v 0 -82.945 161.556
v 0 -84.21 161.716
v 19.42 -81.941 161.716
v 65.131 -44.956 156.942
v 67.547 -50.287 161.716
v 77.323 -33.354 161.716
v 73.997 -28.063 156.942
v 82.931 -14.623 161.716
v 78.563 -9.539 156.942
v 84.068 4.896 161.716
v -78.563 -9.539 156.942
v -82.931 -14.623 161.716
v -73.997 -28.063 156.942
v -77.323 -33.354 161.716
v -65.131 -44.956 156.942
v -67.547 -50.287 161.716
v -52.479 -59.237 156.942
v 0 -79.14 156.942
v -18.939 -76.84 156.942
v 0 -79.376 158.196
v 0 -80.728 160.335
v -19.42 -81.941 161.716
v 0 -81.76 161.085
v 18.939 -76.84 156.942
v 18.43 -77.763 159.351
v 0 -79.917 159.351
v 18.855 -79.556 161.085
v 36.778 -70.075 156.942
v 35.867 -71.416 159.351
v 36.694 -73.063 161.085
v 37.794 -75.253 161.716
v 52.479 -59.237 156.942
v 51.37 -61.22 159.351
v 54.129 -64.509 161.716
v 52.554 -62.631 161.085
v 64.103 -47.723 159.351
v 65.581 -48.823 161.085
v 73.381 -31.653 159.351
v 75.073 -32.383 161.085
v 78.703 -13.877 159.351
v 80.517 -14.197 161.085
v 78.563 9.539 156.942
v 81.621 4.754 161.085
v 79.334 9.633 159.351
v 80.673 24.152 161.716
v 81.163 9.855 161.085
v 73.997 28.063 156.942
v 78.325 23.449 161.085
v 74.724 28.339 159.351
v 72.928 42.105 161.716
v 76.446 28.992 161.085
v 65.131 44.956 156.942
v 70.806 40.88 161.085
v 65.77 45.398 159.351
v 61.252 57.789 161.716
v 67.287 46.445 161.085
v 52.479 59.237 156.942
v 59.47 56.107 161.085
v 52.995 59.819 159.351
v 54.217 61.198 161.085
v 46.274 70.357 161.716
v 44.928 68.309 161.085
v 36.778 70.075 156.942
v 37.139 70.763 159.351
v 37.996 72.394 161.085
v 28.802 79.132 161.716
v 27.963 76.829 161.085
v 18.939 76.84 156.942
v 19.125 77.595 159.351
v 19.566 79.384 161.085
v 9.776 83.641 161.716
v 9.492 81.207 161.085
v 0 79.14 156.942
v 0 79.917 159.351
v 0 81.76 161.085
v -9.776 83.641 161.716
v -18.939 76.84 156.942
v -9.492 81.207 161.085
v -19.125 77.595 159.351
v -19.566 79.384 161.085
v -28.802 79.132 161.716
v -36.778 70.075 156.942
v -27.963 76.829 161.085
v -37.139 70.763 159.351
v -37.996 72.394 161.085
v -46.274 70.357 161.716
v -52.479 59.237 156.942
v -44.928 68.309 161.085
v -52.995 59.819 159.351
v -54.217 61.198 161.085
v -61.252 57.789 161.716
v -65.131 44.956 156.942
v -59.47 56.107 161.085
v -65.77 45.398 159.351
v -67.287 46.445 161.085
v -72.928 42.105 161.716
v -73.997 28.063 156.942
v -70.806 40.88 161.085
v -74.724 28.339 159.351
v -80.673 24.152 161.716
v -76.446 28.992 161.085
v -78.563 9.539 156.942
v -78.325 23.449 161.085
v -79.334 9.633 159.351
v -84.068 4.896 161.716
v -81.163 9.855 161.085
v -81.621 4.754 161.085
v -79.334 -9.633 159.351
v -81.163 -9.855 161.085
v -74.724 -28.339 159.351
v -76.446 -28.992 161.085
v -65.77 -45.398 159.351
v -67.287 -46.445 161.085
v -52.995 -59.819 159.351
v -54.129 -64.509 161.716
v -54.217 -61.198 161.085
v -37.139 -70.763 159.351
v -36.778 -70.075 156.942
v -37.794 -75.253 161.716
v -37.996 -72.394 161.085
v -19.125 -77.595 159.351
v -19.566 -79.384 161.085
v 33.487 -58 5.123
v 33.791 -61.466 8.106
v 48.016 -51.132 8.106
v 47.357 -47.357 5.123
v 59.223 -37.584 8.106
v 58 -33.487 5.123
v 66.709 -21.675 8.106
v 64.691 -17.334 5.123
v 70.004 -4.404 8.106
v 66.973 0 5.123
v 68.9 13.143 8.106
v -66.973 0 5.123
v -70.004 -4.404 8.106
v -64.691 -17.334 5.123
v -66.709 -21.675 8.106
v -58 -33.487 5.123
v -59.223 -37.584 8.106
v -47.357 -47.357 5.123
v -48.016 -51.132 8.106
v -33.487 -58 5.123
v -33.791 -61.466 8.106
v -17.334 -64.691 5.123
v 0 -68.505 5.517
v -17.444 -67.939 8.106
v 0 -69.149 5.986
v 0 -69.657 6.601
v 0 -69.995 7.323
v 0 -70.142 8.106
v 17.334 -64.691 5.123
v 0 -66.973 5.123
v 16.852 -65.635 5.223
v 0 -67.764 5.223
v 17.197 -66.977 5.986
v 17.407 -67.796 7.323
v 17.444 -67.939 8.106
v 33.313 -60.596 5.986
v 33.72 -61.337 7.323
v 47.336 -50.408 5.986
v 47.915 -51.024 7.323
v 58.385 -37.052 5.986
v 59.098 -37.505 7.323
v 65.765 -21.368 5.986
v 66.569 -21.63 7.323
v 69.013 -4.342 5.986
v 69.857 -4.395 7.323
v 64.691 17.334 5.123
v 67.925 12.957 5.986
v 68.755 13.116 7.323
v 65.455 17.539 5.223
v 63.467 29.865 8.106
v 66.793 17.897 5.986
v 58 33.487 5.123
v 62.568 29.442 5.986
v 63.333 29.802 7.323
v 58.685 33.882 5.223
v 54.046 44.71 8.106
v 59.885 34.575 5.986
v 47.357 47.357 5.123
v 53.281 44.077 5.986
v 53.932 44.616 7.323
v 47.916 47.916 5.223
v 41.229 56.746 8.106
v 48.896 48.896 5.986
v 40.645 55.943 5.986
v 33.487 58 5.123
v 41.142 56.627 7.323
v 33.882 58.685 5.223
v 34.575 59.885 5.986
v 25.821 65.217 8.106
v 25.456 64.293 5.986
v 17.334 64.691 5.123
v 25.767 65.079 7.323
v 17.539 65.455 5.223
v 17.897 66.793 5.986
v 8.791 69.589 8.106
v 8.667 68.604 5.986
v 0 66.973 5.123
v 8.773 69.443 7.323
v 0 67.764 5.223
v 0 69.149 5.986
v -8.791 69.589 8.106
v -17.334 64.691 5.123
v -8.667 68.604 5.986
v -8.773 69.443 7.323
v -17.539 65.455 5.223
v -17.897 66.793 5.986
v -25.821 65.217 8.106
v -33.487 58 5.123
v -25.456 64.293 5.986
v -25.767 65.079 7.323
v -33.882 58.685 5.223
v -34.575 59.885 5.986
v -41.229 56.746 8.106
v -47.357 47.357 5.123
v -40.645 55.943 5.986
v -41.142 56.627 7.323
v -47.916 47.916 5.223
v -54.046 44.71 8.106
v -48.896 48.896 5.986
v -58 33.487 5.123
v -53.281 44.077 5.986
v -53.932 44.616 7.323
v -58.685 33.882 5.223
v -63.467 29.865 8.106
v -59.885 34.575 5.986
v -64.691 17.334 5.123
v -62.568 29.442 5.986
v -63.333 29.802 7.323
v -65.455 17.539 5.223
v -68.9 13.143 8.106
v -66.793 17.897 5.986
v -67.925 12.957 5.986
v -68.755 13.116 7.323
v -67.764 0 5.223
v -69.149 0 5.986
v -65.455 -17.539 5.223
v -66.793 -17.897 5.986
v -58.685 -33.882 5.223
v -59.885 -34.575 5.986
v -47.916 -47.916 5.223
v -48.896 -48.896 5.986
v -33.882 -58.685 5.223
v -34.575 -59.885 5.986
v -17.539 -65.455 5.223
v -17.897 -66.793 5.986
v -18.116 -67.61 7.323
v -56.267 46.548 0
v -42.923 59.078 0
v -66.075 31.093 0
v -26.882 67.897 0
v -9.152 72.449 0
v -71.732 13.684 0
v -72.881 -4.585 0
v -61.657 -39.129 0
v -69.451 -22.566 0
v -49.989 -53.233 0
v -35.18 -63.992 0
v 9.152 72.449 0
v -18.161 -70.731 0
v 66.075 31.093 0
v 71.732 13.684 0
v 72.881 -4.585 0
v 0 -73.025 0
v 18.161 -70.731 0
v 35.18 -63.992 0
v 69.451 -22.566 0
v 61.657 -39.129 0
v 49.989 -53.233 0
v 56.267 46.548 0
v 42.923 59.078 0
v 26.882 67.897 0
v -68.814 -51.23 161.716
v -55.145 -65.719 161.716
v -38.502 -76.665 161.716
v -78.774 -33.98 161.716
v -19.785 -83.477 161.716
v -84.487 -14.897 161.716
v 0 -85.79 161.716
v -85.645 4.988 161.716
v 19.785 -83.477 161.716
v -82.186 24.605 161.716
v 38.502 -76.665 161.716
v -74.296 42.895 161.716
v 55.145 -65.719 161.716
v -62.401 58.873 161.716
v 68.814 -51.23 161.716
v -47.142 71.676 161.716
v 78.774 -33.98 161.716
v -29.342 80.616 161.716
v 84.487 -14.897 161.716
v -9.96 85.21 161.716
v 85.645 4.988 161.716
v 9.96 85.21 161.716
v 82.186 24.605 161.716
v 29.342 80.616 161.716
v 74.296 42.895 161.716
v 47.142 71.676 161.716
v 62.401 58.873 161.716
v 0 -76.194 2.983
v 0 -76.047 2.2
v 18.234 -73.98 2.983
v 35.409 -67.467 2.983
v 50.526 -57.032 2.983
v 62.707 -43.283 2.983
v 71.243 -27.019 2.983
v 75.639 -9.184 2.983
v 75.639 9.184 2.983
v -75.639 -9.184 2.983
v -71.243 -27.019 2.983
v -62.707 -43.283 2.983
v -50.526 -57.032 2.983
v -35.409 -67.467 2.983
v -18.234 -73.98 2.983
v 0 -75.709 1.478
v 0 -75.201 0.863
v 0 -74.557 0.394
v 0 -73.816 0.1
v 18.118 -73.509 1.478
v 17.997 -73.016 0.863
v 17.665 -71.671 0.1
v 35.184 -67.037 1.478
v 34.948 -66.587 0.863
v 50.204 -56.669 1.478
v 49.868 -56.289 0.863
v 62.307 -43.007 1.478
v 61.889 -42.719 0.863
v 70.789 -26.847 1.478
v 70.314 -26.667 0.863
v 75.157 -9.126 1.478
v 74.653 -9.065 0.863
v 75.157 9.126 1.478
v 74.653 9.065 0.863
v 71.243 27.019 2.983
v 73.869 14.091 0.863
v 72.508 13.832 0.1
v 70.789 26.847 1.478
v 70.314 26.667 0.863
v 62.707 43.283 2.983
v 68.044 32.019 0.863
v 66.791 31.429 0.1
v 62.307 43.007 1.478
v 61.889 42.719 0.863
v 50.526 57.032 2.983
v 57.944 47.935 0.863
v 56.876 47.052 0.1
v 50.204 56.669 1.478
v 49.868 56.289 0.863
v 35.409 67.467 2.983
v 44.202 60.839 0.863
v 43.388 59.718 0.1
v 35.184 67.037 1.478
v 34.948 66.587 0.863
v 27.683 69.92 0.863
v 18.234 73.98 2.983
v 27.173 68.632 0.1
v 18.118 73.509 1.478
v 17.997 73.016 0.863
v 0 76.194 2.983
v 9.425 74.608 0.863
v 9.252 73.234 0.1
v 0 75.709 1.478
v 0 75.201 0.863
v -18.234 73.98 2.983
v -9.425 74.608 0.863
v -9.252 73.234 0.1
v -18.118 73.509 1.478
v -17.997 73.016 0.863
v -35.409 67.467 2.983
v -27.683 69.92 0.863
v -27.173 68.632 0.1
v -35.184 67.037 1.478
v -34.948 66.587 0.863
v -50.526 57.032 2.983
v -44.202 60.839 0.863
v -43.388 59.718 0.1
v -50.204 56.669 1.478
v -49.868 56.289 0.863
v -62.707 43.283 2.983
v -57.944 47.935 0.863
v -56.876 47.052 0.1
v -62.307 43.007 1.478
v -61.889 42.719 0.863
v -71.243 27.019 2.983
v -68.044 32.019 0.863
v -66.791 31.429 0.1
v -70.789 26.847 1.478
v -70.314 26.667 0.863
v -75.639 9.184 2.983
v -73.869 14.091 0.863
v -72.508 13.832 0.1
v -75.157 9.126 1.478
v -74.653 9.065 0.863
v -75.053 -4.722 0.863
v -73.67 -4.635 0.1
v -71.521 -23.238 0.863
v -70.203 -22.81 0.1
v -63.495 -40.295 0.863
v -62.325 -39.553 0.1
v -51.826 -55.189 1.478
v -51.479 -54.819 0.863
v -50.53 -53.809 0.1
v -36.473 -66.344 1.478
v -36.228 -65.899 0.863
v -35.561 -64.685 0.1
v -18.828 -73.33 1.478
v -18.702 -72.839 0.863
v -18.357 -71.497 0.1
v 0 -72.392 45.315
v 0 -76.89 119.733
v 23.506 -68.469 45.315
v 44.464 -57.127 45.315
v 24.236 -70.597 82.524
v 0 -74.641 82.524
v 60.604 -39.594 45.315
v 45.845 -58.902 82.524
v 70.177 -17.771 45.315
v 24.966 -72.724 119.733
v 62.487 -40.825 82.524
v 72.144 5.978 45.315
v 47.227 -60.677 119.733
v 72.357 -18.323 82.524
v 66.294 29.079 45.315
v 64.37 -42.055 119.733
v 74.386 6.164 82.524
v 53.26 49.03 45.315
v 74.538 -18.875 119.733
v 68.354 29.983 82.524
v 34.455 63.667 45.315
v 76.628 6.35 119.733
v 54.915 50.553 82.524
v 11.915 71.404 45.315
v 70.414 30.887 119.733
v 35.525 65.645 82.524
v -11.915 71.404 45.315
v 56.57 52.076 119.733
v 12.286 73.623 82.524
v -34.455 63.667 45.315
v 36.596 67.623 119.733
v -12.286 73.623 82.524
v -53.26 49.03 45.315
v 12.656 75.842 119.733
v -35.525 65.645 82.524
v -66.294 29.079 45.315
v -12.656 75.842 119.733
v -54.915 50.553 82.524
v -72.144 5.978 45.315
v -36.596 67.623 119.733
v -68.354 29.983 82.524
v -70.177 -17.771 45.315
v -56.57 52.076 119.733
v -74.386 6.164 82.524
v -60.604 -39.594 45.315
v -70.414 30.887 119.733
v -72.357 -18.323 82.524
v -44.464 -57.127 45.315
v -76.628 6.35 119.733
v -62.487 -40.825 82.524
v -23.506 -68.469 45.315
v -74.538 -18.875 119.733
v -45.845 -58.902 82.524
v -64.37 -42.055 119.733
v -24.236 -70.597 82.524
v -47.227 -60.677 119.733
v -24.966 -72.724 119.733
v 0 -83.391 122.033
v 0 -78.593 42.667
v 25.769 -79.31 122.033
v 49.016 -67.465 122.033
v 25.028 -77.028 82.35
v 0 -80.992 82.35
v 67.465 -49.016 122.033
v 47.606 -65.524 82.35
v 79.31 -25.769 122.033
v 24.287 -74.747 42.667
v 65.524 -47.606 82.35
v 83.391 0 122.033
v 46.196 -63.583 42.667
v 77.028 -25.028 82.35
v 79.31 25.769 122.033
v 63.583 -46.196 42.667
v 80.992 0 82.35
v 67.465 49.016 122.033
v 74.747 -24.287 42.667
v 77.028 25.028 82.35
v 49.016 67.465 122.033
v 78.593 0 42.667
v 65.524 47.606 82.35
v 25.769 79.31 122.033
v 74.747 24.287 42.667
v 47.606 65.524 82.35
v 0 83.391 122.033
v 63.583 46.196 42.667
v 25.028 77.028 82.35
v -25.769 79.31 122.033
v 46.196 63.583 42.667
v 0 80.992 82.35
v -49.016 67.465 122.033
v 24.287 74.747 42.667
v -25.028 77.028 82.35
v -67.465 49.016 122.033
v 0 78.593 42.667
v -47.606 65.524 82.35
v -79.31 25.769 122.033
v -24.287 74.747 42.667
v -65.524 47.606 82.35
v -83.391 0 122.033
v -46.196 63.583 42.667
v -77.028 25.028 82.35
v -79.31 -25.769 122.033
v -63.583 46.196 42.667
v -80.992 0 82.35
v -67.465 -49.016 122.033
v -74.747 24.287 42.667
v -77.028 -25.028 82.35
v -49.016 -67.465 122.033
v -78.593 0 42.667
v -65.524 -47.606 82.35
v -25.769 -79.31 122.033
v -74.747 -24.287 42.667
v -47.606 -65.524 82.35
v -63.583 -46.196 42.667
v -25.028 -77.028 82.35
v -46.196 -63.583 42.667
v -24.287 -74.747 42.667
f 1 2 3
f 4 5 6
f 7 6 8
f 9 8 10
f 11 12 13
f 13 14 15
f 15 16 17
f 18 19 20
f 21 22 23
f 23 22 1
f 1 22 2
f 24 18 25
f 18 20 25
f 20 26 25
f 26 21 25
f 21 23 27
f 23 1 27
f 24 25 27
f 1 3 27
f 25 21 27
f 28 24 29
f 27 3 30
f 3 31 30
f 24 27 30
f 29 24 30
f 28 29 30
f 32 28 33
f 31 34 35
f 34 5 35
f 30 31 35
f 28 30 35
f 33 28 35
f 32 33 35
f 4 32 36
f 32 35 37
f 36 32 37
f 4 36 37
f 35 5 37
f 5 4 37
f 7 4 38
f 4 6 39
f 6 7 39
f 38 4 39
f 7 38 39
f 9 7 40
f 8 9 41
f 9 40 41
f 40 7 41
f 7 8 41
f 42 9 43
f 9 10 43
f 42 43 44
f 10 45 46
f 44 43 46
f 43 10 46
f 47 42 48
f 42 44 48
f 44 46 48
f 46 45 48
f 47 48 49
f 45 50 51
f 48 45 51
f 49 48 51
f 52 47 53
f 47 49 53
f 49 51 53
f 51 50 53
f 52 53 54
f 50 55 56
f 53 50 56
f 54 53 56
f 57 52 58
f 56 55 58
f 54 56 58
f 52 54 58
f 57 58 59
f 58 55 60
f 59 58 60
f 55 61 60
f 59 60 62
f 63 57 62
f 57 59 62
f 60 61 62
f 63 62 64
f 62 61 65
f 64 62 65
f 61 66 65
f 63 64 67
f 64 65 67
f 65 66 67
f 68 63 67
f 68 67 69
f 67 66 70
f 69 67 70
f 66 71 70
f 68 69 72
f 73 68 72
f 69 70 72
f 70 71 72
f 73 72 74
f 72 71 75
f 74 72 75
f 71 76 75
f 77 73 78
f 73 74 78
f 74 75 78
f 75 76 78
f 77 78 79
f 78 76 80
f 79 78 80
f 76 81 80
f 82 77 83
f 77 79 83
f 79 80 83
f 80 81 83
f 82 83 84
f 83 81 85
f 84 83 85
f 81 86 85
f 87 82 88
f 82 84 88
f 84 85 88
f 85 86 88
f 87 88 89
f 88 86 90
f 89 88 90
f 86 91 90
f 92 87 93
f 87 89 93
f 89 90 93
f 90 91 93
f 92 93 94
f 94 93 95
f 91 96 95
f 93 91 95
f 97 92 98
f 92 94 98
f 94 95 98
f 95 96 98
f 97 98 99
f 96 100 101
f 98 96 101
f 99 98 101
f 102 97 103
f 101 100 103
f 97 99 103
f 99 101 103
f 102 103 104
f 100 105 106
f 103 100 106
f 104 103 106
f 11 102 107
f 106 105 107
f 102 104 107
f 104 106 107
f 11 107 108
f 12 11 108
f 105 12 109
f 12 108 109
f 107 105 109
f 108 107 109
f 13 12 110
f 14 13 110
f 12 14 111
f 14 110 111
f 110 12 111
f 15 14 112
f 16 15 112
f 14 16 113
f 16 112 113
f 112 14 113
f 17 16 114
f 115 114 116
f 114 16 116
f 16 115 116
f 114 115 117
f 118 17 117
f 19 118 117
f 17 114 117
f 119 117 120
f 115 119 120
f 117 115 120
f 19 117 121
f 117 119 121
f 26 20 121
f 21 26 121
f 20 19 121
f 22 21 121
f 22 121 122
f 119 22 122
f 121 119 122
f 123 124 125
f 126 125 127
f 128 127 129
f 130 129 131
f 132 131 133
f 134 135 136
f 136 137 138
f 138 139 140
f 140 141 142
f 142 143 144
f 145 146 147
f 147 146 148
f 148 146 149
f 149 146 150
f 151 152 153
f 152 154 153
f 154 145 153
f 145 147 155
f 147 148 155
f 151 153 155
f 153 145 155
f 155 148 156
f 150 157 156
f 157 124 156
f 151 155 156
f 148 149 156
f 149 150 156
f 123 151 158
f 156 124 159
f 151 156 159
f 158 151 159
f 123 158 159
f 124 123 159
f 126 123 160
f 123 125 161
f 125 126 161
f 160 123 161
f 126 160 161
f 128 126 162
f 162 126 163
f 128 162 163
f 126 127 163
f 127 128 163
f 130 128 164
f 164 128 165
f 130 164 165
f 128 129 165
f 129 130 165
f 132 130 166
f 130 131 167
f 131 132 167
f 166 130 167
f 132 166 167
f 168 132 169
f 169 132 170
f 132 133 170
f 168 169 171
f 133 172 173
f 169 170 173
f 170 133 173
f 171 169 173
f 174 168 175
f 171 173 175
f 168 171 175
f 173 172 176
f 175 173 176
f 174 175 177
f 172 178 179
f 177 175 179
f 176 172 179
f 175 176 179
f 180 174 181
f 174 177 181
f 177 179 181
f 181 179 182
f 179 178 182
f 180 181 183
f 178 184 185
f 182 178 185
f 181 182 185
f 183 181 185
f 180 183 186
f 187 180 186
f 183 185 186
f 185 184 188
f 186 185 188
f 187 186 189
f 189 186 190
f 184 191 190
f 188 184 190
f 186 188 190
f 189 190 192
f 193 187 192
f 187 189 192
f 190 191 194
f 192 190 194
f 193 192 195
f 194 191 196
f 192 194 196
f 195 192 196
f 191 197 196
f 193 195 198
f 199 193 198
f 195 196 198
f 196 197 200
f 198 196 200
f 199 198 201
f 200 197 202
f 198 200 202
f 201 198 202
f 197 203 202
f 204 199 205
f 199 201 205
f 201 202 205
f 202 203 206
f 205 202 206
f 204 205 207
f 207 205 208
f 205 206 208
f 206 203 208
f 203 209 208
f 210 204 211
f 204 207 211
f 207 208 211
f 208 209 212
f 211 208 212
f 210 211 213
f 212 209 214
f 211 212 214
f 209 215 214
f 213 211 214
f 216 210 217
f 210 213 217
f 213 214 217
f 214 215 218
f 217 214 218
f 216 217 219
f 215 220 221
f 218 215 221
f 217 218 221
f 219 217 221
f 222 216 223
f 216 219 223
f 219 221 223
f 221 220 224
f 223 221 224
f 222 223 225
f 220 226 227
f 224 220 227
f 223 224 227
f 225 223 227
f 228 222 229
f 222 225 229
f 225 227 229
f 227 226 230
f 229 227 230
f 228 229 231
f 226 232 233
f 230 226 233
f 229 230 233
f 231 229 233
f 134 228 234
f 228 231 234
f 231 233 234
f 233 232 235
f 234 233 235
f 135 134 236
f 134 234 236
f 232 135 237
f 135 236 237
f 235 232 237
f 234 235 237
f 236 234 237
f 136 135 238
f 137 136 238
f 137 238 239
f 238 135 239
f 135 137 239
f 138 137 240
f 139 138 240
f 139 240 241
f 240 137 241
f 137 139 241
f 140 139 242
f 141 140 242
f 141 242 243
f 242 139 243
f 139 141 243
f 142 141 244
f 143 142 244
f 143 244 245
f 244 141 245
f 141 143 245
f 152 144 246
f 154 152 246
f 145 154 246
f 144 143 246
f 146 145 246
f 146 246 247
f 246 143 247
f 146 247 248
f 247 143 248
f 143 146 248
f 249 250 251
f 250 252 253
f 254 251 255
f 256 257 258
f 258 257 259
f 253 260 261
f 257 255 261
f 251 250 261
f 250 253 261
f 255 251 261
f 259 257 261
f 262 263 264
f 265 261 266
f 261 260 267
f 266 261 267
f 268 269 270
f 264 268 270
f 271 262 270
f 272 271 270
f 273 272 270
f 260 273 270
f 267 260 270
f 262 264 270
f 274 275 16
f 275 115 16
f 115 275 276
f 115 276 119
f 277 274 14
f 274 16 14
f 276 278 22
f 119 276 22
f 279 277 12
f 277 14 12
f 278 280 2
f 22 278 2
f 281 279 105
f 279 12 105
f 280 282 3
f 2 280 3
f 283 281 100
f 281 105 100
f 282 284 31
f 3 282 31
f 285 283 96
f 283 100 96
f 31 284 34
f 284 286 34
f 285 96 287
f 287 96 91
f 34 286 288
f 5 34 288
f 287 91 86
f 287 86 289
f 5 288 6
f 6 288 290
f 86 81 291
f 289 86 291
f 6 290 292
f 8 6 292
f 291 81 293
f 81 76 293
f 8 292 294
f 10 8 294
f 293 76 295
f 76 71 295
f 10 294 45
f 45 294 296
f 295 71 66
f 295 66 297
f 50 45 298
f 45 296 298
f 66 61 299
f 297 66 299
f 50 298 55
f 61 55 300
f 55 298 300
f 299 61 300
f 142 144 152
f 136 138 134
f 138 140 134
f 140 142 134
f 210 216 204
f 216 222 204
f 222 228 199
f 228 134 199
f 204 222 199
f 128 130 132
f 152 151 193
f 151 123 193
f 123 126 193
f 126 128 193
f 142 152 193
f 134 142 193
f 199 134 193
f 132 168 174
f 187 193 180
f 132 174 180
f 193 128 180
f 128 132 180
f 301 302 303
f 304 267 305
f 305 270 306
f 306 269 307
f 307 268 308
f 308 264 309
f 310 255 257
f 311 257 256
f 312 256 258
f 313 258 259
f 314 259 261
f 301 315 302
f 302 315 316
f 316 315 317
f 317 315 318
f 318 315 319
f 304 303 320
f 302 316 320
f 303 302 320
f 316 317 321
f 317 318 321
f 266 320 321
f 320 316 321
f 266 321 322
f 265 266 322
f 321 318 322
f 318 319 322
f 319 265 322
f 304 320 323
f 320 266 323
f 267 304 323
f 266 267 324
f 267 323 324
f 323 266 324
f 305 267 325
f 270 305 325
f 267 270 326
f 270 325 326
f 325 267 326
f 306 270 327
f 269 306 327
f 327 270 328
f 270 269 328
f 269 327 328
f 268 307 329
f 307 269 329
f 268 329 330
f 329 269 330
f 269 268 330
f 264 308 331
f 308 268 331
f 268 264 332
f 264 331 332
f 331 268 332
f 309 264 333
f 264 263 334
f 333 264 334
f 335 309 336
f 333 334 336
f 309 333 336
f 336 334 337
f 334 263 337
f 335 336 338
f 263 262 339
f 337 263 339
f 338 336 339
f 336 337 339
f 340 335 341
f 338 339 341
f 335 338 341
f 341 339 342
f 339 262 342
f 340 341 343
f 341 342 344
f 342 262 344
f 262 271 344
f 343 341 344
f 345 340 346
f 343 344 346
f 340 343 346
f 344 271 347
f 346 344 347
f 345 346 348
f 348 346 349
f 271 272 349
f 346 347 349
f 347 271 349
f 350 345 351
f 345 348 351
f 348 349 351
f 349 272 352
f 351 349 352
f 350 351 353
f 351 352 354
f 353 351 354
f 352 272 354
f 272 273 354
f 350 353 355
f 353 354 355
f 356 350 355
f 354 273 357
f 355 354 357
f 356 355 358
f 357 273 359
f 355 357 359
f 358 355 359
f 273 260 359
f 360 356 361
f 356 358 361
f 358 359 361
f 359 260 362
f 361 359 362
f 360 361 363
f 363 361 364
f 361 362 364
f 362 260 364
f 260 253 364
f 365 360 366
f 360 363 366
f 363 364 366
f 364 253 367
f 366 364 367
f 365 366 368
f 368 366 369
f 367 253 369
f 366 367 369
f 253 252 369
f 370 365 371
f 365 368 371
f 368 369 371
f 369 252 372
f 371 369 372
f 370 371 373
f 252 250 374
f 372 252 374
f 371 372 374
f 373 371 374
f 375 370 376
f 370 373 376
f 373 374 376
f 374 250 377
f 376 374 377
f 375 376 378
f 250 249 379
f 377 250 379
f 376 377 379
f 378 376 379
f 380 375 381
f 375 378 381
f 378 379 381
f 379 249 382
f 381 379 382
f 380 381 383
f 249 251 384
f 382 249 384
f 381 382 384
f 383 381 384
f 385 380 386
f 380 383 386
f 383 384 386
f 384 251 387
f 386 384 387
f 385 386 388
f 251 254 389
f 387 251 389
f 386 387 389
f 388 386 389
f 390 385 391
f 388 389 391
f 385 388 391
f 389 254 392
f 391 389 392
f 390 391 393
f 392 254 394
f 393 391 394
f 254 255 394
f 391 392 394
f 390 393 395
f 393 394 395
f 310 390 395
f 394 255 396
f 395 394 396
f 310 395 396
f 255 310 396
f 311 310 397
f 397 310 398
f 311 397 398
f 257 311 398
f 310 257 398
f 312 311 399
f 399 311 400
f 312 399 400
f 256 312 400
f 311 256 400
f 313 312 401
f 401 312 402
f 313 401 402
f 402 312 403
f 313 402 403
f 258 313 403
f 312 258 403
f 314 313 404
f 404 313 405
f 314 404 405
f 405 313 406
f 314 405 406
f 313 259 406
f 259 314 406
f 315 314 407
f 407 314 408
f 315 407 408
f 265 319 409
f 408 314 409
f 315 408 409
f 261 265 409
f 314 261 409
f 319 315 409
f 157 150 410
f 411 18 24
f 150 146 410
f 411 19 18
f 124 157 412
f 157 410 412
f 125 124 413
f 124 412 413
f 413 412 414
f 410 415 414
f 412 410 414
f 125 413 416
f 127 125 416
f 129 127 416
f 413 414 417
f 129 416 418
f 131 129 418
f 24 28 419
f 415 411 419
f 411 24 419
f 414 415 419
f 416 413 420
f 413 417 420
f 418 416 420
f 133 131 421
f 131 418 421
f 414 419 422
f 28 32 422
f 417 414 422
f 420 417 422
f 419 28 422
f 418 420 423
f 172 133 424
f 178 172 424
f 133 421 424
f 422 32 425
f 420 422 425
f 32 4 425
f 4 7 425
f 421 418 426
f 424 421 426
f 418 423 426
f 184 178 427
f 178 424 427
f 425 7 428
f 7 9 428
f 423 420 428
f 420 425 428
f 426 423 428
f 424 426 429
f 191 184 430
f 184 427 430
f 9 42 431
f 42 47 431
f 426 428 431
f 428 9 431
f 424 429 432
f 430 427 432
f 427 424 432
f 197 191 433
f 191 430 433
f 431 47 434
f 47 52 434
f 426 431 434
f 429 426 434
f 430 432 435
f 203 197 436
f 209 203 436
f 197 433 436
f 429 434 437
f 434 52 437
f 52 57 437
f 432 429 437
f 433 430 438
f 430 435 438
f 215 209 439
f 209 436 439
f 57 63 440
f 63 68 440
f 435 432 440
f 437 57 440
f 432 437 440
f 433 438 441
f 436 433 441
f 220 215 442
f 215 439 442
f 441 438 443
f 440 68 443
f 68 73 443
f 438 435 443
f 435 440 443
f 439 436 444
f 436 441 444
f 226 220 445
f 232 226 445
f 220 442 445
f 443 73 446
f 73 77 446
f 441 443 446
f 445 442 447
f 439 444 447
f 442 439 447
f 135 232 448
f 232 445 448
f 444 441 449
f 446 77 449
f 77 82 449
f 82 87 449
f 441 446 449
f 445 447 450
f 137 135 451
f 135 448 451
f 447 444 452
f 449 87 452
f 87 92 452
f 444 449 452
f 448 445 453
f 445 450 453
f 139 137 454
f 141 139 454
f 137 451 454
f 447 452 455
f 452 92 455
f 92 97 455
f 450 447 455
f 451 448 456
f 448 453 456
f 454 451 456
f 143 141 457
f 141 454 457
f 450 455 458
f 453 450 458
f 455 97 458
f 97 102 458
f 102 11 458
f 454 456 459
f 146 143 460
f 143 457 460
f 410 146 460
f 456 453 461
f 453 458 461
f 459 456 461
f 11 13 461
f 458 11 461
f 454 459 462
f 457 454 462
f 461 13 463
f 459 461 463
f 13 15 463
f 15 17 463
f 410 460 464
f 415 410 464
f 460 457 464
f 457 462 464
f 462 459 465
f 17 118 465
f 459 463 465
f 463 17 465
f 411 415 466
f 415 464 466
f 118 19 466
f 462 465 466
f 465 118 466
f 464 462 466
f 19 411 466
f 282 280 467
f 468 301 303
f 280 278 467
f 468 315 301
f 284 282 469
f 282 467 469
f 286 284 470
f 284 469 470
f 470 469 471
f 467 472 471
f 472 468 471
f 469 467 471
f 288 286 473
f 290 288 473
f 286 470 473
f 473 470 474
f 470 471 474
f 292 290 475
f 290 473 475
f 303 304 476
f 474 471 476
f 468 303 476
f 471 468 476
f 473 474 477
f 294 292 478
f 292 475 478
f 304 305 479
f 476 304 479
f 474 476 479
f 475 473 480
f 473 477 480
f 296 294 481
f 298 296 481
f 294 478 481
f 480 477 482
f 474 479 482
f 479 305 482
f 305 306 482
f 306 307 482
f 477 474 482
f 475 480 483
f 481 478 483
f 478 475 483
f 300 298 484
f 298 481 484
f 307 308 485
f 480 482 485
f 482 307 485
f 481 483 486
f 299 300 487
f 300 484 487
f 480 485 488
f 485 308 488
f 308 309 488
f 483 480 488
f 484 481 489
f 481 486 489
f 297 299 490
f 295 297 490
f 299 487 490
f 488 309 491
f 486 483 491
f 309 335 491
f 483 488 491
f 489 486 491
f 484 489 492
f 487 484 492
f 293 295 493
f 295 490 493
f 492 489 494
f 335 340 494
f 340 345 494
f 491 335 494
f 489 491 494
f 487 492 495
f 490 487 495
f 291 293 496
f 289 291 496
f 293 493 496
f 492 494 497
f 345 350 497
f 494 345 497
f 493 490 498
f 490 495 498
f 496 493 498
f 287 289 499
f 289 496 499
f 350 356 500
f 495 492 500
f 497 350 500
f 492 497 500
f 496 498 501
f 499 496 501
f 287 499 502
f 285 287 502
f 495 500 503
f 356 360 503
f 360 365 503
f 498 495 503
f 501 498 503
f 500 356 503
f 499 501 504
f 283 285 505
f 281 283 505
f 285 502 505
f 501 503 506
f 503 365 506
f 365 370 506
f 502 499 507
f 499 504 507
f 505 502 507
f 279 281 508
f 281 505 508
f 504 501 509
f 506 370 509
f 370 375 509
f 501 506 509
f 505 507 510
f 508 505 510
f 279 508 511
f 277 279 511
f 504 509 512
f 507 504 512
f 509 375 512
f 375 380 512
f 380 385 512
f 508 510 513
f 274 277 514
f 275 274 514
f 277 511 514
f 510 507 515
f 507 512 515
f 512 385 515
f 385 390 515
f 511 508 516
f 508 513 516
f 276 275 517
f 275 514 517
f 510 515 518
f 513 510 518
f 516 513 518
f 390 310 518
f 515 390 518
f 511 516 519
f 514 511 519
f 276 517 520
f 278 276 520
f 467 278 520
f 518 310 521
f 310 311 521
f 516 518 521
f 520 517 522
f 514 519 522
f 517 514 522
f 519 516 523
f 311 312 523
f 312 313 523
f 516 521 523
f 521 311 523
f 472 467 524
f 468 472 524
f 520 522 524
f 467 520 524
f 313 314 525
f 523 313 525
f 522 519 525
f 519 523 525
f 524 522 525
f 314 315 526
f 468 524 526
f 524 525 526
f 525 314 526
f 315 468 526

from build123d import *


with BuildPart() as f1:
    # F0 (on Right) → F1 (revolve)
    with BuildSketch(Plane.YZ):
        with BuildLine():
            Line((-73.025, 0), (0, 0))
            Line((0, 0), (0, 5.122894))
            Line((0, 5.122894), (-66.973096, 5.122894))
            ThreePointArc((-66.973096, 5.122894), (-69.149371, 5.986086), (-70.142311, 8.106309))
            Line((-70.142311, 8.106309), (-79.13973, 156.942341))
            ThreePointArc((-79.13973, 156.942341), (-80.728433, 160.334697), (-84.210473, 161.715805))
            Line((-84.210473, 161.715805), (-85.789887, 161.715805))
            Line((-85.789887, 161.715805), (-76.194214, 2.983415))
            ThreePointArc((-76.194214, 2.983415), (-75.201275, 0.863193), (-73.025, 0))
        make_face()
    revolve(axis=Axis((0, 0, 2.561447), (0, 0, 1)))


solid = f1.part
